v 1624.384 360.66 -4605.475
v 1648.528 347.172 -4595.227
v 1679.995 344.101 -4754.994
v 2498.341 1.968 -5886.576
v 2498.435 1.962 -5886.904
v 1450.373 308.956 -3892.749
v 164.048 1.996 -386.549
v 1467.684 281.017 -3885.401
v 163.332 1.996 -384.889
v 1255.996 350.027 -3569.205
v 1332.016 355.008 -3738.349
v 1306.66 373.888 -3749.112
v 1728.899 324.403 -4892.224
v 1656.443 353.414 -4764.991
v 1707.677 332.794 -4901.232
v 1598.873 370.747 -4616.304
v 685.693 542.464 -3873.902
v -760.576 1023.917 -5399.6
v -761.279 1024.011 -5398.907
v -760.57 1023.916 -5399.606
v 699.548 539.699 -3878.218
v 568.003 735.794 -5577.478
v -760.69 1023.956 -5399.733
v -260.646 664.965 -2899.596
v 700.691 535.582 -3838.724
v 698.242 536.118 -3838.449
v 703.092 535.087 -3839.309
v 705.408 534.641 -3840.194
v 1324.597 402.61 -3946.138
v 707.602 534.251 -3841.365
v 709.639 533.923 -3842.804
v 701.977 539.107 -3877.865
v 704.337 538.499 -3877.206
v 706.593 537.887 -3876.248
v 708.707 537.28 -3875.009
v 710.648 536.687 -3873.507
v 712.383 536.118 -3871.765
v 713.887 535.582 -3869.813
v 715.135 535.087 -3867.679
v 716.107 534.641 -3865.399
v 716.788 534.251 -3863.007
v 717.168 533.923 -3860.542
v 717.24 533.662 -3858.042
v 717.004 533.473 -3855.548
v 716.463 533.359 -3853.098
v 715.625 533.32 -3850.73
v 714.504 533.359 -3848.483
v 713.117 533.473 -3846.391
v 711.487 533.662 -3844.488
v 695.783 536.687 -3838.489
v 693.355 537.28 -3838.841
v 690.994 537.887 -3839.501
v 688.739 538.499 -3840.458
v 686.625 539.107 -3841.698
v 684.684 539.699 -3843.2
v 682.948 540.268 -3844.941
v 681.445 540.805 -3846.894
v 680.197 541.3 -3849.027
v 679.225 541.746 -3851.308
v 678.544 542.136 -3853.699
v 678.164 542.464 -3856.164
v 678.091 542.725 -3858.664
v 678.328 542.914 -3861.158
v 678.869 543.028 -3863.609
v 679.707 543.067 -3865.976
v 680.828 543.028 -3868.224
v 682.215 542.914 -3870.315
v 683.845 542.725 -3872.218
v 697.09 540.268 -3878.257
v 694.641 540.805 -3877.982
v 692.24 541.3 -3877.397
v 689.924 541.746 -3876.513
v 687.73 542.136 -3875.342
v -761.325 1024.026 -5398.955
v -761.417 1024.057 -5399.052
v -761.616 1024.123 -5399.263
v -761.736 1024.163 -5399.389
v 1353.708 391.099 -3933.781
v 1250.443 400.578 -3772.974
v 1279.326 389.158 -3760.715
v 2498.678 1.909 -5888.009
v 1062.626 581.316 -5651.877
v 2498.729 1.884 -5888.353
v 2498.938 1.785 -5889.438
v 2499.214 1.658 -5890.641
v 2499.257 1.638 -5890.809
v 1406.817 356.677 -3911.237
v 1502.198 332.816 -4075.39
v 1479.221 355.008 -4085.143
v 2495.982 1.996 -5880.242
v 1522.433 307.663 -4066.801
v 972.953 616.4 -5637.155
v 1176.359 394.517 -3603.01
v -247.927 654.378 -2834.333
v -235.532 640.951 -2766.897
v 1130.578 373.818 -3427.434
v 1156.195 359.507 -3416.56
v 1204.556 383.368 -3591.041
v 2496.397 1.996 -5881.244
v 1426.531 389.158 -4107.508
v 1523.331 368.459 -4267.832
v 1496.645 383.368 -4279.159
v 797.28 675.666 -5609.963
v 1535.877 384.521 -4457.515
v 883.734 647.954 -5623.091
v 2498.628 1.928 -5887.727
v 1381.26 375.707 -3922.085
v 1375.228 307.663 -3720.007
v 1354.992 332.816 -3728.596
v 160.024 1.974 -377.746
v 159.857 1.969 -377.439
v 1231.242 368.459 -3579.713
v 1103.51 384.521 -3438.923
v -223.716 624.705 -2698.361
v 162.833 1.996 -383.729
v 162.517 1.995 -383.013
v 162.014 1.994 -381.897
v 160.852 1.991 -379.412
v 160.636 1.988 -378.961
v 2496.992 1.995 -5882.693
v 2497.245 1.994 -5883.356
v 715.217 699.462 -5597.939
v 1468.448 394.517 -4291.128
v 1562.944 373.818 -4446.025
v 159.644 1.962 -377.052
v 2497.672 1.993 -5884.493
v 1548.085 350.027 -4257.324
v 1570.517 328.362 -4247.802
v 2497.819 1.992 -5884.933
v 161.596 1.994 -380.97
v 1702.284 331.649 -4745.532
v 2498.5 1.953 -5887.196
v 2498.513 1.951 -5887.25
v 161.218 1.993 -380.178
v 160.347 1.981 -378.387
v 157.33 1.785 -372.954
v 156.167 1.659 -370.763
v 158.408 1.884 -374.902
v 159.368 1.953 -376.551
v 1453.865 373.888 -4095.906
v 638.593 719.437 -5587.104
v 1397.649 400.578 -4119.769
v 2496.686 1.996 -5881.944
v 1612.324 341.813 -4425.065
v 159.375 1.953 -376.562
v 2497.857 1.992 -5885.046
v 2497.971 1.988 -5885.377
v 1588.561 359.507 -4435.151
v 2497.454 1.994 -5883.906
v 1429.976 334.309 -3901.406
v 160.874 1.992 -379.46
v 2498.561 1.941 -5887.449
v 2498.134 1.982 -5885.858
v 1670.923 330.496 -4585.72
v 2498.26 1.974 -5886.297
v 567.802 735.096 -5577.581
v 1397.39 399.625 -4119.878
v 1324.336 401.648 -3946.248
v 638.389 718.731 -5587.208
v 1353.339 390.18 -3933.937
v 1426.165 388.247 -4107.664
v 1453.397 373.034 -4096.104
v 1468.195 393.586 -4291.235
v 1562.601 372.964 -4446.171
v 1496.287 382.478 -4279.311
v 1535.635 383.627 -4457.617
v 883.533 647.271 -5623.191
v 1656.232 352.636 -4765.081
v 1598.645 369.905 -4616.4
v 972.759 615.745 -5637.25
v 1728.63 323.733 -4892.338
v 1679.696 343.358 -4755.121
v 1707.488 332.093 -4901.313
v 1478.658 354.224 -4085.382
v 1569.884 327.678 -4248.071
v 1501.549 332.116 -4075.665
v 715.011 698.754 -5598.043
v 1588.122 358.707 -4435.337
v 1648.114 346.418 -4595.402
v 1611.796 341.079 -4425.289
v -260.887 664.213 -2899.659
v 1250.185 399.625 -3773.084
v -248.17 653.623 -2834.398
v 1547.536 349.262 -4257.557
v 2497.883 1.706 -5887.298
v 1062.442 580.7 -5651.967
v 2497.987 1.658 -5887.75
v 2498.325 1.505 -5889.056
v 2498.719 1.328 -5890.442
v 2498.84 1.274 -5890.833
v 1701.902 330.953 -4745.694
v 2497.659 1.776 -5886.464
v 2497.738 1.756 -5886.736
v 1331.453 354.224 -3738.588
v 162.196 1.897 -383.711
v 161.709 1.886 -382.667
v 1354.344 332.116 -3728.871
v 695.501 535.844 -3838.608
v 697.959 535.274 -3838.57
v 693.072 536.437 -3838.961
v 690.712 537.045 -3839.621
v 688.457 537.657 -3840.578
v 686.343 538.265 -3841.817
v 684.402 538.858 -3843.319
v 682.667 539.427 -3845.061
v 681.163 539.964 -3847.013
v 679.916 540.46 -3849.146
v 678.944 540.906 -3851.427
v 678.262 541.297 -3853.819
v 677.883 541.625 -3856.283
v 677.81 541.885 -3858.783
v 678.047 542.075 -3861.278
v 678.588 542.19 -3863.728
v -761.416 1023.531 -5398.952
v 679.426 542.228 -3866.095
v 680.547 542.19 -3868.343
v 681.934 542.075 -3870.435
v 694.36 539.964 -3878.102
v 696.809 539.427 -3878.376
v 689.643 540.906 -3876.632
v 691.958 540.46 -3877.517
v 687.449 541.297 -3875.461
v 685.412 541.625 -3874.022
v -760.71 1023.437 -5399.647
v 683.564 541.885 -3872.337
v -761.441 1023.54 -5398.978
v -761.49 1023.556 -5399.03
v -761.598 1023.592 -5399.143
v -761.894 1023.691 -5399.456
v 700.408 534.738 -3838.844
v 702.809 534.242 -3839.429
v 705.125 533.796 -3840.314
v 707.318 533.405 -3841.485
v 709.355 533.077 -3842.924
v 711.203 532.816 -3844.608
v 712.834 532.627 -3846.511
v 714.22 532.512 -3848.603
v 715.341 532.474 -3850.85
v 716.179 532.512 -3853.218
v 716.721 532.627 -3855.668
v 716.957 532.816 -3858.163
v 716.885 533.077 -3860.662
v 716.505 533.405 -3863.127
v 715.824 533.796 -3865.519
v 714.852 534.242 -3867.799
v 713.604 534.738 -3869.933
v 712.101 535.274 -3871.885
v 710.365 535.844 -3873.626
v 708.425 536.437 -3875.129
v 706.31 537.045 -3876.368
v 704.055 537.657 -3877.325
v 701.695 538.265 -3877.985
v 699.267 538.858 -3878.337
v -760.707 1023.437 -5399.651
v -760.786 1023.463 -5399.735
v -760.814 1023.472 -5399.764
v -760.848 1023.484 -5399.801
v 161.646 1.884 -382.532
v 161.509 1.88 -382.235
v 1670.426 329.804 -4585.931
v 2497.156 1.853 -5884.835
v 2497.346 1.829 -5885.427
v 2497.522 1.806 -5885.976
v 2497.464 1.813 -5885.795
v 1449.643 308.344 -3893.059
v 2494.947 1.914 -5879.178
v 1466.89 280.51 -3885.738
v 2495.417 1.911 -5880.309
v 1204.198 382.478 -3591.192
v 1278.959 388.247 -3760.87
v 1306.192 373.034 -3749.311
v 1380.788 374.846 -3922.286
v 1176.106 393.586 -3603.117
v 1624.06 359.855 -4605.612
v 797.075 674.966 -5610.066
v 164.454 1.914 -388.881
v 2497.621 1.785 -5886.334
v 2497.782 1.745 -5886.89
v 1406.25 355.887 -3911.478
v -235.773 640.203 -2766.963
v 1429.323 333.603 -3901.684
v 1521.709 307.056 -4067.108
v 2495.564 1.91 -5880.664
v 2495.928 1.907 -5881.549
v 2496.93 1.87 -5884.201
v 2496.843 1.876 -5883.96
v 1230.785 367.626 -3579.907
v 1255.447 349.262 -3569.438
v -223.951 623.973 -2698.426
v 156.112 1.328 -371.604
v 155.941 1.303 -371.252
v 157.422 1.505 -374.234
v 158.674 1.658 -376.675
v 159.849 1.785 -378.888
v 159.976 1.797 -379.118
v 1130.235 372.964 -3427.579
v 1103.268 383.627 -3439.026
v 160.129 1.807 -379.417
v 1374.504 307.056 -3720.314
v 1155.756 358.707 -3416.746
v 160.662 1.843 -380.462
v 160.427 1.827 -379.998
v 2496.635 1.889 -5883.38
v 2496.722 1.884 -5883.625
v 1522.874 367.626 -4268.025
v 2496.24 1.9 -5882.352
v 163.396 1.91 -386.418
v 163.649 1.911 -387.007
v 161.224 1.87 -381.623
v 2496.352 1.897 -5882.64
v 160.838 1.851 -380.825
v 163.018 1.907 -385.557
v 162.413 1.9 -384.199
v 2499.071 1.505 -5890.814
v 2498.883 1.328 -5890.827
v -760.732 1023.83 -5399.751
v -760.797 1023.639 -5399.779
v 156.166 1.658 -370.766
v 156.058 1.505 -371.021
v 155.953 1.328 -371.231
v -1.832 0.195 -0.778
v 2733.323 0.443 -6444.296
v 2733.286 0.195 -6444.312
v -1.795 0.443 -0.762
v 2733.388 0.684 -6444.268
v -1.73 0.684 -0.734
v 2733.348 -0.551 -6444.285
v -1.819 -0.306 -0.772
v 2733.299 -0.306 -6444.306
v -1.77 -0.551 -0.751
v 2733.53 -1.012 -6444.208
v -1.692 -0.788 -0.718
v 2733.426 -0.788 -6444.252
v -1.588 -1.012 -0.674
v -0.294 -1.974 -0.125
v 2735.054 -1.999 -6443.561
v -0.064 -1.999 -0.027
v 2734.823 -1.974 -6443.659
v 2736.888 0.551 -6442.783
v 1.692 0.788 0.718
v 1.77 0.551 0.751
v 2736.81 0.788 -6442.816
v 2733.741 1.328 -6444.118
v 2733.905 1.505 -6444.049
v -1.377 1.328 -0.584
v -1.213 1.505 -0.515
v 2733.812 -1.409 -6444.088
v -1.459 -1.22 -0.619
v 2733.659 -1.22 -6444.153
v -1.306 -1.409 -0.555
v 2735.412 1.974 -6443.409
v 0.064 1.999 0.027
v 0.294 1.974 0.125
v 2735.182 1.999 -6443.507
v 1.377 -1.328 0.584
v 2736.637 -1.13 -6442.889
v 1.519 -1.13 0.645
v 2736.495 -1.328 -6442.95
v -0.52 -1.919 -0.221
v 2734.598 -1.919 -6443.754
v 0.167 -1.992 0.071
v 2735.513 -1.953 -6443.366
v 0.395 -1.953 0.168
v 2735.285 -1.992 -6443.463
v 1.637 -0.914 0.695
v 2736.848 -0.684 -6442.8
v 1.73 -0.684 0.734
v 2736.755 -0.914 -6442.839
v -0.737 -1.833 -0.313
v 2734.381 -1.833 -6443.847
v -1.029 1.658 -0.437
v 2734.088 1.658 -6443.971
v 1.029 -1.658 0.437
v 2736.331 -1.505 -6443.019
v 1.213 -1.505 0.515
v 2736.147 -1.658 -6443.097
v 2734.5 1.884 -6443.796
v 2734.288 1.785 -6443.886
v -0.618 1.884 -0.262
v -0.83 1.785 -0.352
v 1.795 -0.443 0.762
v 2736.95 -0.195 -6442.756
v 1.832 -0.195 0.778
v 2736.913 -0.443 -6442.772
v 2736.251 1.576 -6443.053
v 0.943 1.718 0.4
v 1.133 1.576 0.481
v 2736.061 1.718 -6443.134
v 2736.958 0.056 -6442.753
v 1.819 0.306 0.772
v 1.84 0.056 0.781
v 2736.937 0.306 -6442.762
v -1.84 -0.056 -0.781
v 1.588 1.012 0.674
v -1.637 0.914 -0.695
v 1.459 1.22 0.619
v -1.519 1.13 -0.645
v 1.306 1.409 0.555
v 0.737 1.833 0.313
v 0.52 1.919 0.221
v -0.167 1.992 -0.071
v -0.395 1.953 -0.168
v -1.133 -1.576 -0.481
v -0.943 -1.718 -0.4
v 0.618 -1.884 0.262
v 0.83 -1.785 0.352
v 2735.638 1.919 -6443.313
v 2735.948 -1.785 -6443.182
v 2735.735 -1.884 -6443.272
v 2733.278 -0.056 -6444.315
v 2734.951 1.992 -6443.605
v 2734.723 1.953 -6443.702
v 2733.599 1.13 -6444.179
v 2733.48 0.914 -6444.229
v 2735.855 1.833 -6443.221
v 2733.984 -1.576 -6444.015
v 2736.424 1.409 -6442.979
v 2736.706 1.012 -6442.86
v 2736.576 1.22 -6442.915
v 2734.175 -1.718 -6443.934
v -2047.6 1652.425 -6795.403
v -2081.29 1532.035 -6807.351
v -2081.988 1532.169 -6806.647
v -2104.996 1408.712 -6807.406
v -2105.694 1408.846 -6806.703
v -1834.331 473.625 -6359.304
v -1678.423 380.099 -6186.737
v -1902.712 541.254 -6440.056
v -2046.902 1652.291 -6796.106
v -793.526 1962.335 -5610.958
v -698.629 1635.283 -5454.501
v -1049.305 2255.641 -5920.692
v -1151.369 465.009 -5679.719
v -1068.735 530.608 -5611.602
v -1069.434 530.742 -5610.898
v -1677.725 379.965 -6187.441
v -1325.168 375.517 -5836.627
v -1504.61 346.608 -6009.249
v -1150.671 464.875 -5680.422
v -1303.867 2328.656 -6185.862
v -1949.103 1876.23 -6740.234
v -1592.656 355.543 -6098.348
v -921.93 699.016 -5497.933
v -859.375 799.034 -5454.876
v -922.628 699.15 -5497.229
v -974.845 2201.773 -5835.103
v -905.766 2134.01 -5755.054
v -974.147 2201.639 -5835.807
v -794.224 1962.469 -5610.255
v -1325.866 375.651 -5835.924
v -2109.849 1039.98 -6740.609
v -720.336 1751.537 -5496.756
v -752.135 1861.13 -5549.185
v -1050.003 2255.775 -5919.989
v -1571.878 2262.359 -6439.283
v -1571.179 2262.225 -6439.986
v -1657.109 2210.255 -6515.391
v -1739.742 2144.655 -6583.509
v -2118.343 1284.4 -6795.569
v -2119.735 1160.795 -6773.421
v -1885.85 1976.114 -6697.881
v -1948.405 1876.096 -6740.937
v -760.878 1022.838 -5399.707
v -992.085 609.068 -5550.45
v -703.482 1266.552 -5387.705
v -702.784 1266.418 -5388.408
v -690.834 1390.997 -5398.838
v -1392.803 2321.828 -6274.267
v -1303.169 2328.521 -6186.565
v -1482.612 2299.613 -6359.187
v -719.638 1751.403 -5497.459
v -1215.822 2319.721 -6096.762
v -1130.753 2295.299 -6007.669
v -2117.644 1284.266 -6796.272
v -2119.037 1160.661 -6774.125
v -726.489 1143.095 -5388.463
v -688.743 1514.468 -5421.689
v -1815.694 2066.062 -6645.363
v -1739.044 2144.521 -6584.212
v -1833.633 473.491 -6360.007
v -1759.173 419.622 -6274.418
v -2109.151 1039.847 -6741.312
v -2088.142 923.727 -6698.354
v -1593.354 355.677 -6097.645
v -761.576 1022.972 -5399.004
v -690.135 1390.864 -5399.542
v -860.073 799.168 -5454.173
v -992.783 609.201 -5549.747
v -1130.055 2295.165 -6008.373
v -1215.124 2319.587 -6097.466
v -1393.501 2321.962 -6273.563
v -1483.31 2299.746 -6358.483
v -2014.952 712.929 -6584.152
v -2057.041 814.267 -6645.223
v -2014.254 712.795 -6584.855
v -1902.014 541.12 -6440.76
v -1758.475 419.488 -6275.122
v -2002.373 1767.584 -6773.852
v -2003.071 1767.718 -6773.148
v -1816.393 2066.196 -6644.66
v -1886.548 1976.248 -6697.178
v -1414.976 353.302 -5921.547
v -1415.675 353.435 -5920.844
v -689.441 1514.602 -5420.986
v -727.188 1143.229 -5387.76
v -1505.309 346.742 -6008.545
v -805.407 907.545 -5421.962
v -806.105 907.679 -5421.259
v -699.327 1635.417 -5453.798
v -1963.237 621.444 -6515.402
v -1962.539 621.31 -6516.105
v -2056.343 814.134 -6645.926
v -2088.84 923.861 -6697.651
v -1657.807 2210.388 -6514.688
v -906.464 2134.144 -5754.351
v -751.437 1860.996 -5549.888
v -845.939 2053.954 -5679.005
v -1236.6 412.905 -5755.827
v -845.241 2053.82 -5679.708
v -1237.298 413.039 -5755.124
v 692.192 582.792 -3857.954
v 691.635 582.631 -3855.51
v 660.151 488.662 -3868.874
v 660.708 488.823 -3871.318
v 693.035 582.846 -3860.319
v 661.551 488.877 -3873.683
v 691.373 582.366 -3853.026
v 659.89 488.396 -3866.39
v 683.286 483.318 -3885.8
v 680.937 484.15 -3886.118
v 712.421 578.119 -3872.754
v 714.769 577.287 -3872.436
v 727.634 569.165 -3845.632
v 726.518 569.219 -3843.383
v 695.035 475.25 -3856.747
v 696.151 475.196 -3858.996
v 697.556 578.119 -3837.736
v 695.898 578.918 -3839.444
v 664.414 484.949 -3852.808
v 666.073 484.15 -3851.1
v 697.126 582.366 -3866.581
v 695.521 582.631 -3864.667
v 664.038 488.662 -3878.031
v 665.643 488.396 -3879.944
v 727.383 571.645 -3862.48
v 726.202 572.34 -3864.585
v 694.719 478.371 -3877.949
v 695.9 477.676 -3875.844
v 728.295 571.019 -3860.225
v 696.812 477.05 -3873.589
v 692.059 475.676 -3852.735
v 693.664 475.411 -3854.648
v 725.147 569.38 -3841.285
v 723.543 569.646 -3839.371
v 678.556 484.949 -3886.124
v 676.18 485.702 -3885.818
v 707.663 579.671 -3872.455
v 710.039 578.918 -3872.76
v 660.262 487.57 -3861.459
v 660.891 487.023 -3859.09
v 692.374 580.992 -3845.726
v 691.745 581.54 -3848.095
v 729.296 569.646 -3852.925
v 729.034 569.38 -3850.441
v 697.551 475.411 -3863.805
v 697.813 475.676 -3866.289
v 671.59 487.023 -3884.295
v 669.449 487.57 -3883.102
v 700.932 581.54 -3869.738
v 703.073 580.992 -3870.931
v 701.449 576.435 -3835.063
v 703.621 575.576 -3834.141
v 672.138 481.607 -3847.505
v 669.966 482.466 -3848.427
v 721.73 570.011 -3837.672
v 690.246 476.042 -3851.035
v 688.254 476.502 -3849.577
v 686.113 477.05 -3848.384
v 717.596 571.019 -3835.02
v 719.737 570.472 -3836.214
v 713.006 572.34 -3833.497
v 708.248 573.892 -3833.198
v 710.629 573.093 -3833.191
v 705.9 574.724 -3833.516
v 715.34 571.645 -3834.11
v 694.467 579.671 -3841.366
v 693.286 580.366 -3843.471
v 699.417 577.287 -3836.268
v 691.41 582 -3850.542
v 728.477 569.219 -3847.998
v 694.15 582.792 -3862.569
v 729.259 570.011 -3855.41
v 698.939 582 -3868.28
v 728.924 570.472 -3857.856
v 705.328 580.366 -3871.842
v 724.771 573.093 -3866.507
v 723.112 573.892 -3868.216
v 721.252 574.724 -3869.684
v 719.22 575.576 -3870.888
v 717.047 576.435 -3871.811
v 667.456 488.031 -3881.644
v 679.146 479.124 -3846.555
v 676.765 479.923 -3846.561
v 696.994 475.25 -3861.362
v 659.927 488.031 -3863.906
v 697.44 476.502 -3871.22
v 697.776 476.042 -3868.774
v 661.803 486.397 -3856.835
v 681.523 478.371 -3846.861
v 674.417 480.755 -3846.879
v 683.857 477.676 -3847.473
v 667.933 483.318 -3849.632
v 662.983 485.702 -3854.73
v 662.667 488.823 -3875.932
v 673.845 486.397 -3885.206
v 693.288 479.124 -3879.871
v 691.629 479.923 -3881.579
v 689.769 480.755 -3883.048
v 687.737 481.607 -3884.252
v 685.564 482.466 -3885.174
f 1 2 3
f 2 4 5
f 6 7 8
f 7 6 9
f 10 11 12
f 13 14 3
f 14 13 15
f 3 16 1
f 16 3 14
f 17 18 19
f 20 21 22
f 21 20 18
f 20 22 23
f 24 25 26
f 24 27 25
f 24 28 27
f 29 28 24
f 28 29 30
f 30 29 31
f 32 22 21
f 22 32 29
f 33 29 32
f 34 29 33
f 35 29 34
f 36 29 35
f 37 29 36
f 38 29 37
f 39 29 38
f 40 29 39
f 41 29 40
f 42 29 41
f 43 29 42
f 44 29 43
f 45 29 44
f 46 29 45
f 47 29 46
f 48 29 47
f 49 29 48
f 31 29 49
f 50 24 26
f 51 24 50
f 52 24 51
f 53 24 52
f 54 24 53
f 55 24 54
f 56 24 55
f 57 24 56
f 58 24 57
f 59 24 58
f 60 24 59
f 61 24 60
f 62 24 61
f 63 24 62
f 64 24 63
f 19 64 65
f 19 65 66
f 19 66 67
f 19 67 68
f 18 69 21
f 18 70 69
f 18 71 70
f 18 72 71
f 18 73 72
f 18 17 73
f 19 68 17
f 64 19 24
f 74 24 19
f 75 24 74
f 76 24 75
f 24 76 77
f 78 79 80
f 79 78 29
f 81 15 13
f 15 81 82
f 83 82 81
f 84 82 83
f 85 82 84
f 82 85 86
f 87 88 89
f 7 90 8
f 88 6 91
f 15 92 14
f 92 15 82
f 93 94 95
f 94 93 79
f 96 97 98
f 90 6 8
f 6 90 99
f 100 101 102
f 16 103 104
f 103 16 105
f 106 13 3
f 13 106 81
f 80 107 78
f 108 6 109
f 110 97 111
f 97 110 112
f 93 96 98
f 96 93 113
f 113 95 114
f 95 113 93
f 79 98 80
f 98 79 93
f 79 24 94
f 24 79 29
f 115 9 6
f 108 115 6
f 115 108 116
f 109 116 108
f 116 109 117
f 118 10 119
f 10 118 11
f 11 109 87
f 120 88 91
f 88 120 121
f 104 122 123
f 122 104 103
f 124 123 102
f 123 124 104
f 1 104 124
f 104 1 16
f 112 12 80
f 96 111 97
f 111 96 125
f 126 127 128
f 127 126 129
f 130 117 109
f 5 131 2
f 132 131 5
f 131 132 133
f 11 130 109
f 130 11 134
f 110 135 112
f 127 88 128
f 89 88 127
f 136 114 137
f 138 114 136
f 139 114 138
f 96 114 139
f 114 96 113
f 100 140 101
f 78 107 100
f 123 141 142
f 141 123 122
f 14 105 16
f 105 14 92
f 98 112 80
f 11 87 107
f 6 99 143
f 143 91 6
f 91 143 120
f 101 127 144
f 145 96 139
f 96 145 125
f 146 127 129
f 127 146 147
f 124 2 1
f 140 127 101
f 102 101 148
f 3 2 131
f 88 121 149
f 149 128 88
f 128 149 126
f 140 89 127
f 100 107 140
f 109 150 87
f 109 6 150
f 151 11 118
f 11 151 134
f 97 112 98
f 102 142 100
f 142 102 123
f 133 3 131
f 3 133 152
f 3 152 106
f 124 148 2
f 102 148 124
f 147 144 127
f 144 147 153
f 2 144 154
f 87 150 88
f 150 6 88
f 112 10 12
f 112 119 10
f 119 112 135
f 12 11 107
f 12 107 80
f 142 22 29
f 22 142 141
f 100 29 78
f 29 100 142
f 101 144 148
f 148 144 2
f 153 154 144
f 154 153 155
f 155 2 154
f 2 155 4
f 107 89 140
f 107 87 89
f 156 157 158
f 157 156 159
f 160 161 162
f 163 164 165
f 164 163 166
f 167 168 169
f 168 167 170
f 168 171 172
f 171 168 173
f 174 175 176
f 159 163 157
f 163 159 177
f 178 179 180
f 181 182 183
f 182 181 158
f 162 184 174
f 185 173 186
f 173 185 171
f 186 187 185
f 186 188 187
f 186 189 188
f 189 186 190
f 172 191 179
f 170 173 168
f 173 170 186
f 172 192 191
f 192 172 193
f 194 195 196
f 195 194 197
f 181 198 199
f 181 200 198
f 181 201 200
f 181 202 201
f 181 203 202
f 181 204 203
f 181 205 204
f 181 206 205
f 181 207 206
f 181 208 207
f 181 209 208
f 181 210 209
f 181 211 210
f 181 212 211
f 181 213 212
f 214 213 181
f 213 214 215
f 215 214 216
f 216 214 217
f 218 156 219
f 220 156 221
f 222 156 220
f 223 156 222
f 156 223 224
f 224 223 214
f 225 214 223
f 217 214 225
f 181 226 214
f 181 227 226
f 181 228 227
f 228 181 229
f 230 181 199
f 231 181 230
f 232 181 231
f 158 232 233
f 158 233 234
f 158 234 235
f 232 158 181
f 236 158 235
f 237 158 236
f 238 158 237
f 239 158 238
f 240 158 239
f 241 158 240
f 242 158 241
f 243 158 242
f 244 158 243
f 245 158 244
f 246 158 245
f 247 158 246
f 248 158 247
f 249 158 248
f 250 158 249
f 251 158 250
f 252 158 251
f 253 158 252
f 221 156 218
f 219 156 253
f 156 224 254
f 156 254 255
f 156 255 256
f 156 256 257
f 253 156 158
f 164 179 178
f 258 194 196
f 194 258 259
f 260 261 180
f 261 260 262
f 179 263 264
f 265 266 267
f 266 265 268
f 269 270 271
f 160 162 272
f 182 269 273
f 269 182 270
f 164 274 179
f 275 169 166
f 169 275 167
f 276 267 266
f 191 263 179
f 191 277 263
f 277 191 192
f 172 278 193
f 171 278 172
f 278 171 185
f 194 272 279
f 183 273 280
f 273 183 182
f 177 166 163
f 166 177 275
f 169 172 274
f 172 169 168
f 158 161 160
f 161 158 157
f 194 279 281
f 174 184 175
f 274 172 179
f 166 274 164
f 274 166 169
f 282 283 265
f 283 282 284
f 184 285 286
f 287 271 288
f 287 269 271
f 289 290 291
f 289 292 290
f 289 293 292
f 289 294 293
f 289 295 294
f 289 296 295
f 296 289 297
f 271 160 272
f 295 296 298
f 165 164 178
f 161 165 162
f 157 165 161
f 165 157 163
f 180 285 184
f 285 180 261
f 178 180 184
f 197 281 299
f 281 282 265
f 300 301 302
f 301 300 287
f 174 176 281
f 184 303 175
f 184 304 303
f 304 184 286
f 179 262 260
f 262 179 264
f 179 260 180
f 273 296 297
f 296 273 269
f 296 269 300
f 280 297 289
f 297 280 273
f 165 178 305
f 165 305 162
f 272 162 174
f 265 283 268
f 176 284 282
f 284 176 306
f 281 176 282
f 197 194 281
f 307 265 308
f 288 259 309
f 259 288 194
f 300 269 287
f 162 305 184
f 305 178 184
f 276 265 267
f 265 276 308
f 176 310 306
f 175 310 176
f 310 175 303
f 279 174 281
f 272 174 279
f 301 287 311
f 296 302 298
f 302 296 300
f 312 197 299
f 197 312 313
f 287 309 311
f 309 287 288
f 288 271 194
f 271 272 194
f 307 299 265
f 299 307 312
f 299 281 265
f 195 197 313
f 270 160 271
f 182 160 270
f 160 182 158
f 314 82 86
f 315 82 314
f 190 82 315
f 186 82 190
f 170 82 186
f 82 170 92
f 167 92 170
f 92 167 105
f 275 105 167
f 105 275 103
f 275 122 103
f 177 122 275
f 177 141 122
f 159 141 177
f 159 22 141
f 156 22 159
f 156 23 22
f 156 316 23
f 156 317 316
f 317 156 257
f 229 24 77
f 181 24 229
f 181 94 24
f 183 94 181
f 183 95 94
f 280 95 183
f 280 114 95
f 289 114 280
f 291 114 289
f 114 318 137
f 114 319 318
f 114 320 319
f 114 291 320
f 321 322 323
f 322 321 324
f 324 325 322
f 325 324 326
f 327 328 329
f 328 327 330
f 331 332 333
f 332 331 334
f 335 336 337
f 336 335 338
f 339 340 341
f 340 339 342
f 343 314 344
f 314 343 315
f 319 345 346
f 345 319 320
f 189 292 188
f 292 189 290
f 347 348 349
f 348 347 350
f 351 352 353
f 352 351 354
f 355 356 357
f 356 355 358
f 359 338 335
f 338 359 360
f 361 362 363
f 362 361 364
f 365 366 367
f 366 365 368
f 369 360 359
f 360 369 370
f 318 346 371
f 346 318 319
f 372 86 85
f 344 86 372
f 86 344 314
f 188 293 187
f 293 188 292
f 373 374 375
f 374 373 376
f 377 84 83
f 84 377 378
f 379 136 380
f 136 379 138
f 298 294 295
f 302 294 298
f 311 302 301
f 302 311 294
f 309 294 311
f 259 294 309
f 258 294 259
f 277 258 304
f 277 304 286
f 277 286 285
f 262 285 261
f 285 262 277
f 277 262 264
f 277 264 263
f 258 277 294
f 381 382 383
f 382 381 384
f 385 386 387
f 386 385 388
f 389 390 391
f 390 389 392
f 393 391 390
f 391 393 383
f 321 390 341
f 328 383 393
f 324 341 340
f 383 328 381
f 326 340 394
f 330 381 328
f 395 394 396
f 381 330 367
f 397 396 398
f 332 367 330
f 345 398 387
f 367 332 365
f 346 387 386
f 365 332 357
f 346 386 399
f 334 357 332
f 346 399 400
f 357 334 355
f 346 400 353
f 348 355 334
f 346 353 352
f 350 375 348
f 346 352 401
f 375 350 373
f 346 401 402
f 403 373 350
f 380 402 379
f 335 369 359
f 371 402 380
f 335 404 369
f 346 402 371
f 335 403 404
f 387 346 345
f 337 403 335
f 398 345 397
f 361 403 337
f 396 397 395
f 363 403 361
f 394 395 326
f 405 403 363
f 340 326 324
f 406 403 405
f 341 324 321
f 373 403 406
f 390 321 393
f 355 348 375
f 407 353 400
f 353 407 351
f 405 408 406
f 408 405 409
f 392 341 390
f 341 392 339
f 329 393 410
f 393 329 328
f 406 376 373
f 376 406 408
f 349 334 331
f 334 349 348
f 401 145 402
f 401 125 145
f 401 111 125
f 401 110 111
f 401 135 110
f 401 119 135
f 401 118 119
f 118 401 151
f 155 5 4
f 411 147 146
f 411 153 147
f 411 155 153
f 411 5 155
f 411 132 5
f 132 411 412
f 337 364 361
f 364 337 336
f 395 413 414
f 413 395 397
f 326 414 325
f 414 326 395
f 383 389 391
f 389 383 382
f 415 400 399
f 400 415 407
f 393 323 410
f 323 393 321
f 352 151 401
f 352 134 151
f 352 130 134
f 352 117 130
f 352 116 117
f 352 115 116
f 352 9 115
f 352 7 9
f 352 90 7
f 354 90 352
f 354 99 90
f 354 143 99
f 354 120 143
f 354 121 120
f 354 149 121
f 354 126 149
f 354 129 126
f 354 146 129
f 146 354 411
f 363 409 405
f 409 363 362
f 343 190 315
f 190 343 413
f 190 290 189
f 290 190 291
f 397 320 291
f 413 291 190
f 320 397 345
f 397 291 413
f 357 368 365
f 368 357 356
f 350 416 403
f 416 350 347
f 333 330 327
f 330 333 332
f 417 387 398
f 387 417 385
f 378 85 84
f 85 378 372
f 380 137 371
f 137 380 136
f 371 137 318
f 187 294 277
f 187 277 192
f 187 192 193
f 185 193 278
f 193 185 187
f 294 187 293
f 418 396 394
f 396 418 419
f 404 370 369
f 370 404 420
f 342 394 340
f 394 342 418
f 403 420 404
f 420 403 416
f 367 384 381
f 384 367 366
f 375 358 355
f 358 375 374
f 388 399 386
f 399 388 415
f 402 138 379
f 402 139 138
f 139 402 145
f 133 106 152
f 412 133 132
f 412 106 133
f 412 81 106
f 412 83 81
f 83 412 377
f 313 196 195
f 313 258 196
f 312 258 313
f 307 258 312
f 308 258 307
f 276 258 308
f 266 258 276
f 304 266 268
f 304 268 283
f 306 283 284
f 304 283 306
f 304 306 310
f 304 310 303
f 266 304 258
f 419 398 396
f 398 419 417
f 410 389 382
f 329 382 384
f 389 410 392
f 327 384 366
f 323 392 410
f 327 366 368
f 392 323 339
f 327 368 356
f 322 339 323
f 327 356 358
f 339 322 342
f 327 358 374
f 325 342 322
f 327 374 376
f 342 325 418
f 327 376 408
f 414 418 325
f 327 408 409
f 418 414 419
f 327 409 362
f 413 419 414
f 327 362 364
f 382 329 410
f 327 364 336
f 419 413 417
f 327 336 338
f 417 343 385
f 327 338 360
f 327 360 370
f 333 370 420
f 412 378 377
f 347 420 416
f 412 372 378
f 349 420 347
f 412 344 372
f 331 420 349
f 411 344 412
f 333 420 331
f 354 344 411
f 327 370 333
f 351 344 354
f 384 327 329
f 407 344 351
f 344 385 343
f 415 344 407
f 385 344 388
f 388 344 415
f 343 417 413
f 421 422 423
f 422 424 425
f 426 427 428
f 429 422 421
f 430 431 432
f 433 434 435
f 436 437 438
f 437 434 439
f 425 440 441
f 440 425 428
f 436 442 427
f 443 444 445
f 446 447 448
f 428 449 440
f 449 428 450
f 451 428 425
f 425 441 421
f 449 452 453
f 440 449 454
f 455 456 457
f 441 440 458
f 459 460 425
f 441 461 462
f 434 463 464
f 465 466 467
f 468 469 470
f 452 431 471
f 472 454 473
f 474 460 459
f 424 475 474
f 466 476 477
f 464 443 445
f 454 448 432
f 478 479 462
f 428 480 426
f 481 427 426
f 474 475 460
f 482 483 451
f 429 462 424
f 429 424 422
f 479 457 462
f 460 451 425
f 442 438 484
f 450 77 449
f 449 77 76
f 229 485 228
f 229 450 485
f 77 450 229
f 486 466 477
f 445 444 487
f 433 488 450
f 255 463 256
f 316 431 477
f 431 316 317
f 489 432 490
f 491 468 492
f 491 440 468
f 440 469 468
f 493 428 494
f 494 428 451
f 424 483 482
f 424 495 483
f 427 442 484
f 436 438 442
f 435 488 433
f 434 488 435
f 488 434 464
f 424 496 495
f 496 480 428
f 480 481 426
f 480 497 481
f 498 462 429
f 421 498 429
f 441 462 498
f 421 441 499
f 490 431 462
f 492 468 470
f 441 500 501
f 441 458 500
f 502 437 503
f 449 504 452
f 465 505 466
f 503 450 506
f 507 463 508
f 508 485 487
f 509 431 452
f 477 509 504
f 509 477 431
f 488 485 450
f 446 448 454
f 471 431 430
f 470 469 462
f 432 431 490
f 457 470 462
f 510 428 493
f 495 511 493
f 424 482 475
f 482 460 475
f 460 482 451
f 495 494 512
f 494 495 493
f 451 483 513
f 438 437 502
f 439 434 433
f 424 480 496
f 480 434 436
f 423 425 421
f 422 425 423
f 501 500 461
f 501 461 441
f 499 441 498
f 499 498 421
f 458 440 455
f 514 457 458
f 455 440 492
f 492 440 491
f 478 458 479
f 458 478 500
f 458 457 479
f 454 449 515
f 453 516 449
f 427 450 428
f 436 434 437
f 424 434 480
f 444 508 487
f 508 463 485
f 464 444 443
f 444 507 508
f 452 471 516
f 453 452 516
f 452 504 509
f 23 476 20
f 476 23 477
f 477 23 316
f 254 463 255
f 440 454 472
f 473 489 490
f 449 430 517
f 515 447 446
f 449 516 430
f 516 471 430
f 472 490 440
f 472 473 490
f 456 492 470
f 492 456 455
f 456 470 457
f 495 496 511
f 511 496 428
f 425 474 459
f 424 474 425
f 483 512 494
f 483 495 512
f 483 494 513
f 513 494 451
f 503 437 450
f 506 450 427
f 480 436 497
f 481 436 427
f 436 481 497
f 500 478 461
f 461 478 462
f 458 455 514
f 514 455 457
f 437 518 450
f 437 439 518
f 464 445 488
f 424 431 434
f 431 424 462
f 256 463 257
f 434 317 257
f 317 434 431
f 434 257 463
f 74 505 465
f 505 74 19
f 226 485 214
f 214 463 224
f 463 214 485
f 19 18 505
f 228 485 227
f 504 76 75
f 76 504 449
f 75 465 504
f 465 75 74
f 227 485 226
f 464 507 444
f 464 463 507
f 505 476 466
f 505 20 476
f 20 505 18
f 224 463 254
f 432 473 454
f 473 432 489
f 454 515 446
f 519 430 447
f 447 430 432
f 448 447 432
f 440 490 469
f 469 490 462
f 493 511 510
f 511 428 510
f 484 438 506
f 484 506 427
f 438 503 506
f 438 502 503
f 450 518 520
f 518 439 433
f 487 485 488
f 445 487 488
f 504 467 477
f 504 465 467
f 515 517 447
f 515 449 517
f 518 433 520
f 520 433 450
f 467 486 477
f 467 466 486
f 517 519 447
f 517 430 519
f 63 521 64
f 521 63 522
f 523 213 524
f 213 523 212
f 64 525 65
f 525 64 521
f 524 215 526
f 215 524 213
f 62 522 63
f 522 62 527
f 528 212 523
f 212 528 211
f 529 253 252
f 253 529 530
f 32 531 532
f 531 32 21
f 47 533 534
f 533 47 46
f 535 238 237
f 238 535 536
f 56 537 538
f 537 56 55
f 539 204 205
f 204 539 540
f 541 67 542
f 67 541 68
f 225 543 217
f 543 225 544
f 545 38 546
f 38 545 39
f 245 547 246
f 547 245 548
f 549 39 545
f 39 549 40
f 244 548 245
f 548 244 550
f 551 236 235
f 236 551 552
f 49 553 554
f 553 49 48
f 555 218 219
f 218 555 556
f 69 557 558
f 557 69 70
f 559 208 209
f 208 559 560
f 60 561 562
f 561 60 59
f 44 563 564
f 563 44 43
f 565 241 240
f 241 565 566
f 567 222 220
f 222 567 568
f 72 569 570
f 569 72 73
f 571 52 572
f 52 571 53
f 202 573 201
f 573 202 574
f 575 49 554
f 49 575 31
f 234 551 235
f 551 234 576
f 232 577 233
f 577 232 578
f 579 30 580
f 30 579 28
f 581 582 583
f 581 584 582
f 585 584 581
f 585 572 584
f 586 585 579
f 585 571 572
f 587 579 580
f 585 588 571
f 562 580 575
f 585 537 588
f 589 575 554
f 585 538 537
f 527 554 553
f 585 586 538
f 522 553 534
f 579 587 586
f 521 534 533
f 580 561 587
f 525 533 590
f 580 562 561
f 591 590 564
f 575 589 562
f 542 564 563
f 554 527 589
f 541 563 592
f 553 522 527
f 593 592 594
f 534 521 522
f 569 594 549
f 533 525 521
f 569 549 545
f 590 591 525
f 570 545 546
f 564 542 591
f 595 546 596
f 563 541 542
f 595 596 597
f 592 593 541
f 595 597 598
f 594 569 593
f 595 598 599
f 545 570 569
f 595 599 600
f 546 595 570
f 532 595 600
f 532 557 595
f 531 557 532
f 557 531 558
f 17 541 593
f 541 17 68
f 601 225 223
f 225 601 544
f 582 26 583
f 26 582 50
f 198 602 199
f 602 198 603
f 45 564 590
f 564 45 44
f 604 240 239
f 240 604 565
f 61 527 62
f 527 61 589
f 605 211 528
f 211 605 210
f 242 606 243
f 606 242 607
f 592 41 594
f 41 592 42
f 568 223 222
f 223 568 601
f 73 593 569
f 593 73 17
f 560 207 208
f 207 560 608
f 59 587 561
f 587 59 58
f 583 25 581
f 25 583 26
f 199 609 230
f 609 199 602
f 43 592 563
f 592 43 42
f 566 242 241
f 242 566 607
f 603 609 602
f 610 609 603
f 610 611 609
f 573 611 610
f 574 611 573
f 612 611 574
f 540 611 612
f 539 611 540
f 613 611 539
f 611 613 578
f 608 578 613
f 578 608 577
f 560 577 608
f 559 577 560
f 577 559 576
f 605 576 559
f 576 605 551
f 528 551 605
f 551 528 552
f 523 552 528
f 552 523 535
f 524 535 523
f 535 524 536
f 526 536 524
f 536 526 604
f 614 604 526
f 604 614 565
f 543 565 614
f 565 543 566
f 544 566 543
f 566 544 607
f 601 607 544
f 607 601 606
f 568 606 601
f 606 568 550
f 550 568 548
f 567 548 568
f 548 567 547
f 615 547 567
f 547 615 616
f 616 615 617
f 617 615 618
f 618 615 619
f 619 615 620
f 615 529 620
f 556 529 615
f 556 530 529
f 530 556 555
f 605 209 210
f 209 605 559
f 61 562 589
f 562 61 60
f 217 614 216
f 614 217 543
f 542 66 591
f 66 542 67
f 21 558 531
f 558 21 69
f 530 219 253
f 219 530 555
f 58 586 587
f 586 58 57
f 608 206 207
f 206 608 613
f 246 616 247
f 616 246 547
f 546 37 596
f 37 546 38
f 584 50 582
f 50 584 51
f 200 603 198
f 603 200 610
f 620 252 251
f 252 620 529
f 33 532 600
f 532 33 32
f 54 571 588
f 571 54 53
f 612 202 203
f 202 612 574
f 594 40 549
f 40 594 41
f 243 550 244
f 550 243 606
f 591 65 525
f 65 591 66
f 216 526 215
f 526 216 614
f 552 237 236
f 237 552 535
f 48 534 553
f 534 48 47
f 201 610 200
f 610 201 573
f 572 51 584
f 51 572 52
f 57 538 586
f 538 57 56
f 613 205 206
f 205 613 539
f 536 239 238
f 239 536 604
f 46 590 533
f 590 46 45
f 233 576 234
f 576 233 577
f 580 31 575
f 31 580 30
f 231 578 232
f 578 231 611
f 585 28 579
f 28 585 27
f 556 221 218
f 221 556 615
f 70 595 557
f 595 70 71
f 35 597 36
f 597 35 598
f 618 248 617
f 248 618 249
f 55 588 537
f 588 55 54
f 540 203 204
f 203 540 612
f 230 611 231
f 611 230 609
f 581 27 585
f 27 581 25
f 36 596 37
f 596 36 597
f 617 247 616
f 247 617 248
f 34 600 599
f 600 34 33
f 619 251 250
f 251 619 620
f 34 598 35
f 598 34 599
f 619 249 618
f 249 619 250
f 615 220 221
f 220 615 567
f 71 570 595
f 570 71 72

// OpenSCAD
/*
perShkat = 5230;
cappa = 38.63; // топовый угол 
betta = 70.21; //Галсовый угол при полной парусности
pShkAngle = 20; // Угол под лик-тросом генуи.
spustPoTrosu = 0;
*/


// Штиляка:
//   9 квадратов так:

 perShkat = 6000;
 cappa = 35;
 betta = 60;
 pShkAngle = 23;
 spustPoTrosu = 150;


//55;//60; //Площадь обрезанного до 55 градусов: 7 квадратов. и
// 7.5, если обрезать до 60ти. 

nizhShkat = perShkat * sin(cappa) / sin(180 - betta - cappa) ;  //3450;
medianaLen = sqrt( pow(perShkat/2,2)+pow(nizhShkat,2)-perShkat*nizhShkat*cos(betta) );
mediGamma = 90 - asin( sin(betta)*nizhShkat/medianaLen ); // 24; // Угол при  медиане полного паруса.

aX = nizhShkat*sin(betta);
aZ = nizhShkat*cos(betta);
// echo( "aX = ", aX); // 3246
// echo( "aZ = ", aZ); //1168 
 // Пузо 4%

 cpX = aX/3;
 cpZ = aZ/3 + perShkat/3;

 //d1 = 500;

  echo("area = ", perShkat*aX/2 * (1/1000000)); // 8.5 кв м

 // высота паруса
 //echo (" h = " , perShkat * sin(betta)); // 4921







ht = perShkat;


Genoa();

module Genoa() {
$fn=50;

    rotate([ 0 , 0 , 180 ])
//    rotate([ 0 , 90 -betta , 0 ])

//    rotate([ 0 , 32 , 0 ]) // Вместо предыдущего, при установке на    бушприте!!!
    rotate([ 0 , pShkAngle , 0 ]) // Вместо предыдущего, при установке на    бушприте!!!

    rotate([ 0 , 0 , -20 ])
    translate([ 0 , 0 , -perShkat-250-spustPoTrosu ])
    {

    translate([ 0 , 0 , -600 ])
    cylinder( h = perShkat + 1000 , d = 4 );


    translate([ 0 , 0 , ht/2 ])
    difference() {
        hull() {

            translate([ 424 , 0 , -ht/8 ]) 
            resize([ 536 , 536 , ht/2 ]) 
            sphere();

            cylinder(r = 1, h = ht , center = true);

            translate([ aX , 0 , 0 ])
            cylinder(r = 1, h = ht , center = true);

        }

        hull() {

            translate([ 424 , 0 , -ht/8 ]) 
            resize([ 534 , 534 , ht/2 ]) 
            sphere();

            cylinder(r = 1/2 , h = ht , center = true);

            translate([ aX , 0 , 0 ])
            cylinder(r = 1/2 , h = ht , center = true);

        }

        translate([ 0 , 0 , -ht/2 -1])
        cube([ ht , ht , ht+2 ]);

        translate([ 0 , 0 , -ht/2 ])
        rotate([ 0 , betta-90 , 0 ])
        translate([ 0 , 0 , -ht/2 ])
        cube([ 2*ht , ht , ht ], center=true);

        translate([ 0 , 0 , ht/2 ])
        rotate([ 0 , 90-cappa , 0 ])
        translate([ 0 , 0 , ht/2 ])
        cube([ 2*ht , ht , ht ], center=true);

    }

    translate([ aX-1 , 0 , aZ ])
    rotate([ 0 , mediGamma , 0 ])
    translate([ 1000 , 0 , 0 ])
    cylinder( h = 1, r = 1000 , center=true );

// Цилиндр центра парусности
    translate([ cpX , -200 , cpZ ])
    rotate([90,0,0])
    cylinder(r=20, h = 100,  center=true);


    }
}
